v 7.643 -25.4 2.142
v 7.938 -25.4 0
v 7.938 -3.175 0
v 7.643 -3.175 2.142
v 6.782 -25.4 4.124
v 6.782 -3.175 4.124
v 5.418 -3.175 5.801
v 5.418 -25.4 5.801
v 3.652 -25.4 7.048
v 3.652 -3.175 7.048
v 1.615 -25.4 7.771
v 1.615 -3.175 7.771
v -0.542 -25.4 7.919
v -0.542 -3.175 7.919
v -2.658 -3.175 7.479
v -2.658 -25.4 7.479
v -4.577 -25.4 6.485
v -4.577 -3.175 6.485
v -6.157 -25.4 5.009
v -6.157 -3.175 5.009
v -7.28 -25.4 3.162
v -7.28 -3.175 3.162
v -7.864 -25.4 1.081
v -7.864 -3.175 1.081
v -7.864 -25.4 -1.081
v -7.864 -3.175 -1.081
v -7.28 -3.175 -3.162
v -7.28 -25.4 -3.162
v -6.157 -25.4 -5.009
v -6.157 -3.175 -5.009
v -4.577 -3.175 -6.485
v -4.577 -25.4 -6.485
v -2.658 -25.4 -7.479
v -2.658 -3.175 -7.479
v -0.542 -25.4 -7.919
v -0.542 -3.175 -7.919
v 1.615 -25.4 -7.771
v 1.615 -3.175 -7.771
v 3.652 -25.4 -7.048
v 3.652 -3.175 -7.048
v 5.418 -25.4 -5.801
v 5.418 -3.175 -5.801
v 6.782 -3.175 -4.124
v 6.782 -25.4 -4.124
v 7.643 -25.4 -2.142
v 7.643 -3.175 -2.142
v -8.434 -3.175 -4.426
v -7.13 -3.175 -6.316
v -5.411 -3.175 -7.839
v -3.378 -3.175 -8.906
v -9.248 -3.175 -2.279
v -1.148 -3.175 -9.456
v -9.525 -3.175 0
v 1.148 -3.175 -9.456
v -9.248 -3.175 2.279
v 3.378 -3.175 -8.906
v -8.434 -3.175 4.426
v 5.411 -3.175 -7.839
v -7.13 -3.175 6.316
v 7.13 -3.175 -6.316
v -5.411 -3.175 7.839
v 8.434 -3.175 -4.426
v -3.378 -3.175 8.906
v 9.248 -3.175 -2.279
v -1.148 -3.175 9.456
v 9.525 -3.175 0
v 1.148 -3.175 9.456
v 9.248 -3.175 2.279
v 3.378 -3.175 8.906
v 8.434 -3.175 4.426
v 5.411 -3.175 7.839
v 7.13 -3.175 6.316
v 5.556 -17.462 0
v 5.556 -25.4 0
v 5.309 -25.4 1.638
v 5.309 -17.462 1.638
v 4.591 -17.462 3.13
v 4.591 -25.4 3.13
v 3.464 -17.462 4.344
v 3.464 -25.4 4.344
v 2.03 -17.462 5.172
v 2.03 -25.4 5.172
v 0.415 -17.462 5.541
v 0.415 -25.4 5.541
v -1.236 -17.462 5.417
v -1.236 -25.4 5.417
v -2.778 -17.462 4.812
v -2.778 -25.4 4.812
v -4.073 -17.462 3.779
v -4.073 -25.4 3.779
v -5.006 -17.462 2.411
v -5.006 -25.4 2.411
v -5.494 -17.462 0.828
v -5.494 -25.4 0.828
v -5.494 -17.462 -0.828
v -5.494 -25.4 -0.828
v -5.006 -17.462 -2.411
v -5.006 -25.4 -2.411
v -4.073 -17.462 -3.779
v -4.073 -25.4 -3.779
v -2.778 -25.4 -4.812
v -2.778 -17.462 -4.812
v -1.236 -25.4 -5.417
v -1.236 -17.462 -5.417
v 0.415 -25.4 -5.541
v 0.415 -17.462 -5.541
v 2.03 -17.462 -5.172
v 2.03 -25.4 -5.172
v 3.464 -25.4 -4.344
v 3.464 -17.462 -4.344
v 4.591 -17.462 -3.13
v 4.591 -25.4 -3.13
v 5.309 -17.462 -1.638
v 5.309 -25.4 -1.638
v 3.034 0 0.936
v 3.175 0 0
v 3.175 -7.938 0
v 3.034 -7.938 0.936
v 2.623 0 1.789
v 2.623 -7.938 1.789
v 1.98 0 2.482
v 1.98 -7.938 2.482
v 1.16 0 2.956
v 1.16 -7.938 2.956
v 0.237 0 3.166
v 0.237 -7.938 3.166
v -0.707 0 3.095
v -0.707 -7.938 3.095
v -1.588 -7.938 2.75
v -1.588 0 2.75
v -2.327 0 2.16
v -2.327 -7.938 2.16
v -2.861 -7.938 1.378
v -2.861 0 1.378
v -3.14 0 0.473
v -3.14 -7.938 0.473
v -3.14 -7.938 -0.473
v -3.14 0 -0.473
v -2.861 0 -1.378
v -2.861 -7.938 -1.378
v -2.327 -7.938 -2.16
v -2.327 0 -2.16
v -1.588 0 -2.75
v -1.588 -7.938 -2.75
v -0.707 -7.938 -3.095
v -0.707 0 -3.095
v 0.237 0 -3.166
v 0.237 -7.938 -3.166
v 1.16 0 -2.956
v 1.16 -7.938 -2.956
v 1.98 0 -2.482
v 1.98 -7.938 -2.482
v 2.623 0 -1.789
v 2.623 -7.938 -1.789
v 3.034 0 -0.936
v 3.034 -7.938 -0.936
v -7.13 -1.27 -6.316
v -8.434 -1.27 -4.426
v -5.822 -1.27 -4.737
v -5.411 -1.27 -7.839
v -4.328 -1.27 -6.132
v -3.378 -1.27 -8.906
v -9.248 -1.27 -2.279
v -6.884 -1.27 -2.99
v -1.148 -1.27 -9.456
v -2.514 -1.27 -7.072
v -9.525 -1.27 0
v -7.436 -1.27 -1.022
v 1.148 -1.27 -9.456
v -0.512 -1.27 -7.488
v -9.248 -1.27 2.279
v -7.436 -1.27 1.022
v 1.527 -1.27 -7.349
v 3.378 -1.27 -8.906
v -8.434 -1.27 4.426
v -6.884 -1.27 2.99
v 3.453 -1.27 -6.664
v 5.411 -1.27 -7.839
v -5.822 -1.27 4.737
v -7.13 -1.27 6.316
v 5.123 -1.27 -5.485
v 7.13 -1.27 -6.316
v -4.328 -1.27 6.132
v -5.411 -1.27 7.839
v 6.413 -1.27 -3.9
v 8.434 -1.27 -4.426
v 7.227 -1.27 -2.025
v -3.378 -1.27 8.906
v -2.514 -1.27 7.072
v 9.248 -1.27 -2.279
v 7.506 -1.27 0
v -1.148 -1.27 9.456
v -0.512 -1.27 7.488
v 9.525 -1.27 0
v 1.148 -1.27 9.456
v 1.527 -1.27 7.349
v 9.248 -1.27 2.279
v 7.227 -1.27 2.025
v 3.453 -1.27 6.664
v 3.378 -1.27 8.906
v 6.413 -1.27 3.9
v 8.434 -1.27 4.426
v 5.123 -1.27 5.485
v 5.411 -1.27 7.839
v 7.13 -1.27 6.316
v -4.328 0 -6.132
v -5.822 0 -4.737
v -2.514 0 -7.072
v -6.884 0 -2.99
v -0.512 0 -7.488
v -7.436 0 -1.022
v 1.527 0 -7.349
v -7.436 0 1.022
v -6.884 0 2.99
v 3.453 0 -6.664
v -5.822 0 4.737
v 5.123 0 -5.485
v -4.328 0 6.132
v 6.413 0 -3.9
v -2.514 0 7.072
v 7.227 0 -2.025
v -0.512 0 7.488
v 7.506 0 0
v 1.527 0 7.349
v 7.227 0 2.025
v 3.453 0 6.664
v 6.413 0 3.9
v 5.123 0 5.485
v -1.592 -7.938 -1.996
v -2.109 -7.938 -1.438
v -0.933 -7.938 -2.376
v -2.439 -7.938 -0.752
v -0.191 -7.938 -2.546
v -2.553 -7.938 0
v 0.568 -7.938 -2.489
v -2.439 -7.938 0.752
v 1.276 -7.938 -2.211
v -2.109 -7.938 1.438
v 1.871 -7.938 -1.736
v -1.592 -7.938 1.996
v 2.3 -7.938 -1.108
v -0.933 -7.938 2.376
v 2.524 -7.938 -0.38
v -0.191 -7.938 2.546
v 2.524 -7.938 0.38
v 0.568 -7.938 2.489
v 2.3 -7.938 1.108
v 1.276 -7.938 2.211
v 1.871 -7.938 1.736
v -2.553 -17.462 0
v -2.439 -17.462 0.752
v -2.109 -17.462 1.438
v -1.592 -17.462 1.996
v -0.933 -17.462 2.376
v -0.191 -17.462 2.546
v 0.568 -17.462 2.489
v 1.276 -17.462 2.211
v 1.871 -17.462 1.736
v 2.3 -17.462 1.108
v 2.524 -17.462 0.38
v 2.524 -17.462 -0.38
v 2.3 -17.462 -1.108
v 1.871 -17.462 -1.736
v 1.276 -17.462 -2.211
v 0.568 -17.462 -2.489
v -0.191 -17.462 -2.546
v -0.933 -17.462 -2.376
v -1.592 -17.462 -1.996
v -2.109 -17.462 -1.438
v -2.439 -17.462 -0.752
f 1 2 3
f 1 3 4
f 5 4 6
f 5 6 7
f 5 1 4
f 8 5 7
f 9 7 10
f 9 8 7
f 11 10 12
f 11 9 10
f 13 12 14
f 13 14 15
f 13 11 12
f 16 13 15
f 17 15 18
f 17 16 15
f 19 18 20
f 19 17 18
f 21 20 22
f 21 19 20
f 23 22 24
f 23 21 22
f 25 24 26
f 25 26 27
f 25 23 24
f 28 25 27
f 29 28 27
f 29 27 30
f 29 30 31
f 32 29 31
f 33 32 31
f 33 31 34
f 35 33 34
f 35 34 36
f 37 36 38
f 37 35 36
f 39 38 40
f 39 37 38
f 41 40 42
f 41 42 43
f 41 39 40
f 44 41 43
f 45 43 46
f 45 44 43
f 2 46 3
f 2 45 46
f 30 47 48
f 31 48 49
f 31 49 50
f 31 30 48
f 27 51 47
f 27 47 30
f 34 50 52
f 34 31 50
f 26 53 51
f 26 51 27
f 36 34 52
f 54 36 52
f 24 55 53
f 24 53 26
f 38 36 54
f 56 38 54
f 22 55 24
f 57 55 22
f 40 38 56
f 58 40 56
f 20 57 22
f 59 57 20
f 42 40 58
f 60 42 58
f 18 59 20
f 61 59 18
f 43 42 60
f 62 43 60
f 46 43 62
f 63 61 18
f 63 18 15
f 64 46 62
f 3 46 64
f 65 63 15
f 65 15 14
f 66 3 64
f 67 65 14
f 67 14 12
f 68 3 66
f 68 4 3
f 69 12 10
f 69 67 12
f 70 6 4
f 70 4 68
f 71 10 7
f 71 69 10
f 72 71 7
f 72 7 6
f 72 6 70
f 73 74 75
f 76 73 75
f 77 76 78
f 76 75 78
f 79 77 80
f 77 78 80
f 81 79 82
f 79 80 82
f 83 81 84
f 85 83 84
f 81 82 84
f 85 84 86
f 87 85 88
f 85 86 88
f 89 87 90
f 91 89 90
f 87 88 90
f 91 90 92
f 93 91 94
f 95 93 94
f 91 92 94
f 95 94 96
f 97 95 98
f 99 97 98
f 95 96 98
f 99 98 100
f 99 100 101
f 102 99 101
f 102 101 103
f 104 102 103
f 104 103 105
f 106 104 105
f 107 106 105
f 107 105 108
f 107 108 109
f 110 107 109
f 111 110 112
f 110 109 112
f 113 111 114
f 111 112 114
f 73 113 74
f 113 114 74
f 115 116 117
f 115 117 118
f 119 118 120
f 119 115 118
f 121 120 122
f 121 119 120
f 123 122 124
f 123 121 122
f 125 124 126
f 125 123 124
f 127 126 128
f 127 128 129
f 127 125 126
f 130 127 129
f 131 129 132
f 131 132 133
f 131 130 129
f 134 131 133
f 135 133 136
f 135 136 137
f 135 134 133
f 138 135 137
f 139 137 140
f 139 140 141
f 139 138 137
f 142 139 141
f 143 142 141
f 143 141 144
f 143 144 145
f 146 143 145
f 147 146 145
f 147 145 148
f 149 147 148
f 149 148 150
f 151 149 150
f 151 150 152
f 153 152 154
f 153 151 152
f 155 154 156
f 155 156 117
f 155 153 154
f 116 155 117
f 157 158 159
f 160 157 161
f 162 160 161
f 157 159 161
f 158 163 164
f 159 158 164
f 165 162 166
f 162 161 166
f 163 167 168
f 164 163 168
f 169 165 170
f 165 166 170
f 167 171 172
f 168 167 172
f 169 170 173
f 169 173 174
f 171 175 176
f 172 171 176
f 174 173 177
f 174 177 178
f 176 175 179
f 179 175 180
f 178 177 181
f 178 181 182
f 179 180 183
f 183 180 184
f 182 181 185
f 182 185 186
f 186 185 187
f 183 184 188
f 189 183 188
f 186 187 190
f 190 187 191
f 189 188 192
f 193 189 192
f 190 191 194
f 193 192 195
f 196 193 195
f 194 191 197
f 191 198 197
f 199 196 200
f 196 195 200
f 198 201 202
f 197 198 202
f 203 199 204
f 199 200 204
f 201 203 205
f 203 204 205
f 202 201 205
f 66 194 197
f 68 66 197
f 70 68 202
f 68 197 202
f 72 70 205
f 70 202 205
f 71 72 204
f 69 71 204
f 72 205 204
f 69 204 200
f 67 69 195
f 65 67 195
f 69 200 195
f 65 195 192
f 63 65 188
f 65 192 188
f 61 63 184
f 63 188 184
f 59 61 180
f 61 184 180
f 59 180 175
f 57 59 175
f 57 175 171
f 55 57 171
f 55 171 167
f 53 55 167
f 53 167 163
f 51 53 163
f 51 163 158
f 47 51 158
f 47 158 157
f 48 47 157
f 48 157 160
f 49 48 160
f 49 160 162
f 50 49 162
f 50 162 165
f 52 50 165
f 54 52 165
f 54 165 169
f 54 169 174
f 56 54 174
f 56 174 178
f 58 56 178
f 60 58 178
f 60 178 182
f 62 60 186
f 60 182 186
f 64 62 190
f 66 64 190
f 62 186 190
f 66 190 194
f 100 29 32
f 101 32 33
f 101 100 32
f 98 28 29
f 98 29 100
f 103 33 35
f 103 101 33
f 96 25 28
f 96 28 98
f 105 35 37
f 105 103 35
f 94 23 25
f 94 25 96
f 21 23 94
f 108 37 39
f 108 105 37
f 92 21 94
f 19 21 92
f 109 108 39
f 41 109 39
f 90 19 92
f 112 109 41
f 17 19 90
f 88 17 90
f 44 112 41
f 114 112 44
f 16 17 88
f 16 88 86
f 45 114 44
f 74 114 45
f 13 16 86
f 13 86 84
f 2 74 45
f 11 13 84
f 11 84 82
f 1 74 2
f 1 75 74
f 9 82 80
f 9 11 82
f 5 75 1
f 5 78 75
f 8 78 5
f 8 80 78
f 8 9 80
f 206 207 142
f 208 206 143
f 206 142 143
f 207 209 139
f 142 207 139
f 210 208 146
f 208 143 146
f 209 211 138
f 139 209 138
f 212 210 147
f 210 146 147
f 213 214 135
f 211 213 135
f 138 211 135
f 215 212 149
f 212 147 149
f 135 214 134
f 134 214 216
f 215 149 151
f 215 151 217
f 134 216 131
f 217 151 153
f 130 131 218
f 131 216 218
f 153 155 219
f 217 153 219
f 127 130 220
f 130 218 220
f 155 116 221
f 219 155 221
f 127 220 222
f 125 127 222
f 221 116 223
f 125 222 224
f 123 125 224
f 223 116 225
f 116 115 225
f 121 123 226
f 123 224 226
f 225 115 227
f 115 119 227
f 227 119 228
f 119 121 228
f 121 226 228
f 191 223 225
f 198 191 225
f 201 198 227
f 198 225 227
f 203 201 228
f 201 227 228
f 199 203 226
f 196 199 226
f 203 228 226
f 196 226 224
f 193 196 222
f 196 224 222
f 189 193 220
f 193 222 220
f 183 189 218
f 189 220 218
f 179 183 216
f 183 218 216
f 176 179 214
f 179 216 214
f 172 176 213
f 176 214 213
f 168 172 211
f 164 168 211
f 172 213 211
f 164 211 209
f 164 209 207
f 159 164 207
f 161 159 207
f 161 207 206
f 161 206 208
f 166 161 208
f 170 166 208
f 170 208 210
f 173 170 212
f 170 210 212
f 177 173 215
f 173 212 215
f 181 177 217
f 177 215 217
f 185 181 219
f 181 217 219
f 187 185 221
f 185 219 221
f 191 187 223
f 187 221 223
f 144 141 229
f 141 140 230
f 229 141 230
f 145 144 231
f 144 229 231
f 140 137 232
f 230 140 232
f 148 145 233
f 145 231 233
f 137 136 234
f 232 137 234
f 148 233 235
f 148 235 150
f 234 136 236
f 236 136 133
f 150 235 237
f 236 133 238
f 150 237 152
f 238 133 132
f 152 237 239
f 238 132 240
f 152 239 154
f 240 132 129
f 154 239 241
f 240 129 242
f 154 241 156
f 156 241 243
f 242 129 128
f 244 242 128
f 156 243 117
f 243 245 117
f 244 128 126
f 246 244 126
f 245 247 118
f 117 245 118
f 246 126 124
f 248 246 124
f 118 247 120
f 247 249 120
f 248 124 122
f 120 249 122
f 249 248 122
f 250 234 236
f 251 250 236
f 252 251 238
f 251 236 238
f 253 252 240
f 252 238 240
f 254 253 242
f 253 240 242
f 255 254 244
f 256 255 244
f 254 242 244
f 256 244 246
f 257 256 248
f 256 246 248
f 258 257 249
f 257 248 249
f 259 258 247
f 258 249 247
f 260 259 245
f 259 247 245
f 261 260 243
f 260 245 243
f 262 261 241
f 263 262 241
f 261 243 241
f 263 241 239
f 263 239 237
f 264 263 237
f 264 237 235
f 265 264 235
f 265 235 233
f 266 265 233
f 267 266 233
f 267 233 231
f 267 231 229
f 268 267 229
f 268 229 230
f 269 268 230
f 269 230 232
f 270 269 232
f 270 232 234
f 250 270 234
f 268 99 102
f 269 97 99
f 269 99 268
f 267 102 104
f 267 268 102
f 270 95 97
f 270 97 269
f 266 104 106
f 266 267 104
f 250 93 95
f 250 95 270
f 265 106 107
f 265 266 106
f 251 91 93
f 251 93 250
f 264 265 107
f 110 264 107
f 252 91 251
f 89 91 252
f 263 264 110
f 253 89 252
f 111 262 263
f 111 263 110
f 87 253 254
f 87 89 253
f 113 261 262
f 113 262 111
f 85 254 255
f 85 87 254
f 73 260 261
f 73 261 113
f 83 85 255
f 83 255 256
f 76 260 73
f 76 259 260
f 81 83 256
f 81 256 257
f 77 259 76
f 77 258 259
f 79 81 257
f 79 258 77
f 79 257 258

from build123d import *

# Parameters (mm, degrees)
F0_R     = 9.525
F0_R_2   = 7.5057
F0_R_3   = 3.175
F1_DEPTH = 25.4
F2_R     = 5.55625
F3_DEPTH = 7.9375
F2_R_2   = 9.525
F2_R_3   = 7.9375
F5_DEPTH = 22.225
F6_DEPTH = 1.27
F7_DEPTH = 7.9375
F8_D     = 5.1054


with BuildPart() as f1:
    # F0 (on Front) → F1 (new body)
    with BuildSketch(Plane.XZ):
        Circle(F0_R)
        Circle(F0_R_2, mode=Mode.SUBTRACT)
        Circle(F0_R_2)
        Circle(F0_R_3, mode=Mode.SUBTRACT)
        Circle(F0_R_3)
    extrude(amount=F1_DEPTH)

    # F2 (on face) → F3 (cut)
    with BuildSketch(Plane.XZ.offset(25.4)):
        Circle(F2_R)
    extrude(amount=-F3_DEPTH, mode=Mode.SUBTRACT)

    # F2 (on face) → F5 (cut)
    with BuildSketch(Plane.XZ.offset(25.4)):
        Circle(F2_R_2)
        Circle(F2_R_3, mode=Mode.SUBTRACT)
    extrude(amount=-F5_DEPTH, mode=Mode.SUBTRACT)

    # F0 (on Front) → F6 (cut)
    with BuildSketch(Plane.XZ):
        Circle(F0_R)
        Circle(F0_R_2, mode=Mode.SUBTRACT)
    extrude(amount=F6_DEPTH, mode=Mode.SUBTRACT)

    # F0 (on Front) → F7 (cut)
    with BuildSketch(Plane.XZ):
        Circle(F0_R_3)
    extrude(amount=F7_DEPTH, mode=Mode.SUBTRACT)

    # F8 (through all)
    with Locations(Plane.XZ.offset(17.4625)):
        with Locations((0, 0)):
            Hole(F8_D / 2)


solid = f1.part
